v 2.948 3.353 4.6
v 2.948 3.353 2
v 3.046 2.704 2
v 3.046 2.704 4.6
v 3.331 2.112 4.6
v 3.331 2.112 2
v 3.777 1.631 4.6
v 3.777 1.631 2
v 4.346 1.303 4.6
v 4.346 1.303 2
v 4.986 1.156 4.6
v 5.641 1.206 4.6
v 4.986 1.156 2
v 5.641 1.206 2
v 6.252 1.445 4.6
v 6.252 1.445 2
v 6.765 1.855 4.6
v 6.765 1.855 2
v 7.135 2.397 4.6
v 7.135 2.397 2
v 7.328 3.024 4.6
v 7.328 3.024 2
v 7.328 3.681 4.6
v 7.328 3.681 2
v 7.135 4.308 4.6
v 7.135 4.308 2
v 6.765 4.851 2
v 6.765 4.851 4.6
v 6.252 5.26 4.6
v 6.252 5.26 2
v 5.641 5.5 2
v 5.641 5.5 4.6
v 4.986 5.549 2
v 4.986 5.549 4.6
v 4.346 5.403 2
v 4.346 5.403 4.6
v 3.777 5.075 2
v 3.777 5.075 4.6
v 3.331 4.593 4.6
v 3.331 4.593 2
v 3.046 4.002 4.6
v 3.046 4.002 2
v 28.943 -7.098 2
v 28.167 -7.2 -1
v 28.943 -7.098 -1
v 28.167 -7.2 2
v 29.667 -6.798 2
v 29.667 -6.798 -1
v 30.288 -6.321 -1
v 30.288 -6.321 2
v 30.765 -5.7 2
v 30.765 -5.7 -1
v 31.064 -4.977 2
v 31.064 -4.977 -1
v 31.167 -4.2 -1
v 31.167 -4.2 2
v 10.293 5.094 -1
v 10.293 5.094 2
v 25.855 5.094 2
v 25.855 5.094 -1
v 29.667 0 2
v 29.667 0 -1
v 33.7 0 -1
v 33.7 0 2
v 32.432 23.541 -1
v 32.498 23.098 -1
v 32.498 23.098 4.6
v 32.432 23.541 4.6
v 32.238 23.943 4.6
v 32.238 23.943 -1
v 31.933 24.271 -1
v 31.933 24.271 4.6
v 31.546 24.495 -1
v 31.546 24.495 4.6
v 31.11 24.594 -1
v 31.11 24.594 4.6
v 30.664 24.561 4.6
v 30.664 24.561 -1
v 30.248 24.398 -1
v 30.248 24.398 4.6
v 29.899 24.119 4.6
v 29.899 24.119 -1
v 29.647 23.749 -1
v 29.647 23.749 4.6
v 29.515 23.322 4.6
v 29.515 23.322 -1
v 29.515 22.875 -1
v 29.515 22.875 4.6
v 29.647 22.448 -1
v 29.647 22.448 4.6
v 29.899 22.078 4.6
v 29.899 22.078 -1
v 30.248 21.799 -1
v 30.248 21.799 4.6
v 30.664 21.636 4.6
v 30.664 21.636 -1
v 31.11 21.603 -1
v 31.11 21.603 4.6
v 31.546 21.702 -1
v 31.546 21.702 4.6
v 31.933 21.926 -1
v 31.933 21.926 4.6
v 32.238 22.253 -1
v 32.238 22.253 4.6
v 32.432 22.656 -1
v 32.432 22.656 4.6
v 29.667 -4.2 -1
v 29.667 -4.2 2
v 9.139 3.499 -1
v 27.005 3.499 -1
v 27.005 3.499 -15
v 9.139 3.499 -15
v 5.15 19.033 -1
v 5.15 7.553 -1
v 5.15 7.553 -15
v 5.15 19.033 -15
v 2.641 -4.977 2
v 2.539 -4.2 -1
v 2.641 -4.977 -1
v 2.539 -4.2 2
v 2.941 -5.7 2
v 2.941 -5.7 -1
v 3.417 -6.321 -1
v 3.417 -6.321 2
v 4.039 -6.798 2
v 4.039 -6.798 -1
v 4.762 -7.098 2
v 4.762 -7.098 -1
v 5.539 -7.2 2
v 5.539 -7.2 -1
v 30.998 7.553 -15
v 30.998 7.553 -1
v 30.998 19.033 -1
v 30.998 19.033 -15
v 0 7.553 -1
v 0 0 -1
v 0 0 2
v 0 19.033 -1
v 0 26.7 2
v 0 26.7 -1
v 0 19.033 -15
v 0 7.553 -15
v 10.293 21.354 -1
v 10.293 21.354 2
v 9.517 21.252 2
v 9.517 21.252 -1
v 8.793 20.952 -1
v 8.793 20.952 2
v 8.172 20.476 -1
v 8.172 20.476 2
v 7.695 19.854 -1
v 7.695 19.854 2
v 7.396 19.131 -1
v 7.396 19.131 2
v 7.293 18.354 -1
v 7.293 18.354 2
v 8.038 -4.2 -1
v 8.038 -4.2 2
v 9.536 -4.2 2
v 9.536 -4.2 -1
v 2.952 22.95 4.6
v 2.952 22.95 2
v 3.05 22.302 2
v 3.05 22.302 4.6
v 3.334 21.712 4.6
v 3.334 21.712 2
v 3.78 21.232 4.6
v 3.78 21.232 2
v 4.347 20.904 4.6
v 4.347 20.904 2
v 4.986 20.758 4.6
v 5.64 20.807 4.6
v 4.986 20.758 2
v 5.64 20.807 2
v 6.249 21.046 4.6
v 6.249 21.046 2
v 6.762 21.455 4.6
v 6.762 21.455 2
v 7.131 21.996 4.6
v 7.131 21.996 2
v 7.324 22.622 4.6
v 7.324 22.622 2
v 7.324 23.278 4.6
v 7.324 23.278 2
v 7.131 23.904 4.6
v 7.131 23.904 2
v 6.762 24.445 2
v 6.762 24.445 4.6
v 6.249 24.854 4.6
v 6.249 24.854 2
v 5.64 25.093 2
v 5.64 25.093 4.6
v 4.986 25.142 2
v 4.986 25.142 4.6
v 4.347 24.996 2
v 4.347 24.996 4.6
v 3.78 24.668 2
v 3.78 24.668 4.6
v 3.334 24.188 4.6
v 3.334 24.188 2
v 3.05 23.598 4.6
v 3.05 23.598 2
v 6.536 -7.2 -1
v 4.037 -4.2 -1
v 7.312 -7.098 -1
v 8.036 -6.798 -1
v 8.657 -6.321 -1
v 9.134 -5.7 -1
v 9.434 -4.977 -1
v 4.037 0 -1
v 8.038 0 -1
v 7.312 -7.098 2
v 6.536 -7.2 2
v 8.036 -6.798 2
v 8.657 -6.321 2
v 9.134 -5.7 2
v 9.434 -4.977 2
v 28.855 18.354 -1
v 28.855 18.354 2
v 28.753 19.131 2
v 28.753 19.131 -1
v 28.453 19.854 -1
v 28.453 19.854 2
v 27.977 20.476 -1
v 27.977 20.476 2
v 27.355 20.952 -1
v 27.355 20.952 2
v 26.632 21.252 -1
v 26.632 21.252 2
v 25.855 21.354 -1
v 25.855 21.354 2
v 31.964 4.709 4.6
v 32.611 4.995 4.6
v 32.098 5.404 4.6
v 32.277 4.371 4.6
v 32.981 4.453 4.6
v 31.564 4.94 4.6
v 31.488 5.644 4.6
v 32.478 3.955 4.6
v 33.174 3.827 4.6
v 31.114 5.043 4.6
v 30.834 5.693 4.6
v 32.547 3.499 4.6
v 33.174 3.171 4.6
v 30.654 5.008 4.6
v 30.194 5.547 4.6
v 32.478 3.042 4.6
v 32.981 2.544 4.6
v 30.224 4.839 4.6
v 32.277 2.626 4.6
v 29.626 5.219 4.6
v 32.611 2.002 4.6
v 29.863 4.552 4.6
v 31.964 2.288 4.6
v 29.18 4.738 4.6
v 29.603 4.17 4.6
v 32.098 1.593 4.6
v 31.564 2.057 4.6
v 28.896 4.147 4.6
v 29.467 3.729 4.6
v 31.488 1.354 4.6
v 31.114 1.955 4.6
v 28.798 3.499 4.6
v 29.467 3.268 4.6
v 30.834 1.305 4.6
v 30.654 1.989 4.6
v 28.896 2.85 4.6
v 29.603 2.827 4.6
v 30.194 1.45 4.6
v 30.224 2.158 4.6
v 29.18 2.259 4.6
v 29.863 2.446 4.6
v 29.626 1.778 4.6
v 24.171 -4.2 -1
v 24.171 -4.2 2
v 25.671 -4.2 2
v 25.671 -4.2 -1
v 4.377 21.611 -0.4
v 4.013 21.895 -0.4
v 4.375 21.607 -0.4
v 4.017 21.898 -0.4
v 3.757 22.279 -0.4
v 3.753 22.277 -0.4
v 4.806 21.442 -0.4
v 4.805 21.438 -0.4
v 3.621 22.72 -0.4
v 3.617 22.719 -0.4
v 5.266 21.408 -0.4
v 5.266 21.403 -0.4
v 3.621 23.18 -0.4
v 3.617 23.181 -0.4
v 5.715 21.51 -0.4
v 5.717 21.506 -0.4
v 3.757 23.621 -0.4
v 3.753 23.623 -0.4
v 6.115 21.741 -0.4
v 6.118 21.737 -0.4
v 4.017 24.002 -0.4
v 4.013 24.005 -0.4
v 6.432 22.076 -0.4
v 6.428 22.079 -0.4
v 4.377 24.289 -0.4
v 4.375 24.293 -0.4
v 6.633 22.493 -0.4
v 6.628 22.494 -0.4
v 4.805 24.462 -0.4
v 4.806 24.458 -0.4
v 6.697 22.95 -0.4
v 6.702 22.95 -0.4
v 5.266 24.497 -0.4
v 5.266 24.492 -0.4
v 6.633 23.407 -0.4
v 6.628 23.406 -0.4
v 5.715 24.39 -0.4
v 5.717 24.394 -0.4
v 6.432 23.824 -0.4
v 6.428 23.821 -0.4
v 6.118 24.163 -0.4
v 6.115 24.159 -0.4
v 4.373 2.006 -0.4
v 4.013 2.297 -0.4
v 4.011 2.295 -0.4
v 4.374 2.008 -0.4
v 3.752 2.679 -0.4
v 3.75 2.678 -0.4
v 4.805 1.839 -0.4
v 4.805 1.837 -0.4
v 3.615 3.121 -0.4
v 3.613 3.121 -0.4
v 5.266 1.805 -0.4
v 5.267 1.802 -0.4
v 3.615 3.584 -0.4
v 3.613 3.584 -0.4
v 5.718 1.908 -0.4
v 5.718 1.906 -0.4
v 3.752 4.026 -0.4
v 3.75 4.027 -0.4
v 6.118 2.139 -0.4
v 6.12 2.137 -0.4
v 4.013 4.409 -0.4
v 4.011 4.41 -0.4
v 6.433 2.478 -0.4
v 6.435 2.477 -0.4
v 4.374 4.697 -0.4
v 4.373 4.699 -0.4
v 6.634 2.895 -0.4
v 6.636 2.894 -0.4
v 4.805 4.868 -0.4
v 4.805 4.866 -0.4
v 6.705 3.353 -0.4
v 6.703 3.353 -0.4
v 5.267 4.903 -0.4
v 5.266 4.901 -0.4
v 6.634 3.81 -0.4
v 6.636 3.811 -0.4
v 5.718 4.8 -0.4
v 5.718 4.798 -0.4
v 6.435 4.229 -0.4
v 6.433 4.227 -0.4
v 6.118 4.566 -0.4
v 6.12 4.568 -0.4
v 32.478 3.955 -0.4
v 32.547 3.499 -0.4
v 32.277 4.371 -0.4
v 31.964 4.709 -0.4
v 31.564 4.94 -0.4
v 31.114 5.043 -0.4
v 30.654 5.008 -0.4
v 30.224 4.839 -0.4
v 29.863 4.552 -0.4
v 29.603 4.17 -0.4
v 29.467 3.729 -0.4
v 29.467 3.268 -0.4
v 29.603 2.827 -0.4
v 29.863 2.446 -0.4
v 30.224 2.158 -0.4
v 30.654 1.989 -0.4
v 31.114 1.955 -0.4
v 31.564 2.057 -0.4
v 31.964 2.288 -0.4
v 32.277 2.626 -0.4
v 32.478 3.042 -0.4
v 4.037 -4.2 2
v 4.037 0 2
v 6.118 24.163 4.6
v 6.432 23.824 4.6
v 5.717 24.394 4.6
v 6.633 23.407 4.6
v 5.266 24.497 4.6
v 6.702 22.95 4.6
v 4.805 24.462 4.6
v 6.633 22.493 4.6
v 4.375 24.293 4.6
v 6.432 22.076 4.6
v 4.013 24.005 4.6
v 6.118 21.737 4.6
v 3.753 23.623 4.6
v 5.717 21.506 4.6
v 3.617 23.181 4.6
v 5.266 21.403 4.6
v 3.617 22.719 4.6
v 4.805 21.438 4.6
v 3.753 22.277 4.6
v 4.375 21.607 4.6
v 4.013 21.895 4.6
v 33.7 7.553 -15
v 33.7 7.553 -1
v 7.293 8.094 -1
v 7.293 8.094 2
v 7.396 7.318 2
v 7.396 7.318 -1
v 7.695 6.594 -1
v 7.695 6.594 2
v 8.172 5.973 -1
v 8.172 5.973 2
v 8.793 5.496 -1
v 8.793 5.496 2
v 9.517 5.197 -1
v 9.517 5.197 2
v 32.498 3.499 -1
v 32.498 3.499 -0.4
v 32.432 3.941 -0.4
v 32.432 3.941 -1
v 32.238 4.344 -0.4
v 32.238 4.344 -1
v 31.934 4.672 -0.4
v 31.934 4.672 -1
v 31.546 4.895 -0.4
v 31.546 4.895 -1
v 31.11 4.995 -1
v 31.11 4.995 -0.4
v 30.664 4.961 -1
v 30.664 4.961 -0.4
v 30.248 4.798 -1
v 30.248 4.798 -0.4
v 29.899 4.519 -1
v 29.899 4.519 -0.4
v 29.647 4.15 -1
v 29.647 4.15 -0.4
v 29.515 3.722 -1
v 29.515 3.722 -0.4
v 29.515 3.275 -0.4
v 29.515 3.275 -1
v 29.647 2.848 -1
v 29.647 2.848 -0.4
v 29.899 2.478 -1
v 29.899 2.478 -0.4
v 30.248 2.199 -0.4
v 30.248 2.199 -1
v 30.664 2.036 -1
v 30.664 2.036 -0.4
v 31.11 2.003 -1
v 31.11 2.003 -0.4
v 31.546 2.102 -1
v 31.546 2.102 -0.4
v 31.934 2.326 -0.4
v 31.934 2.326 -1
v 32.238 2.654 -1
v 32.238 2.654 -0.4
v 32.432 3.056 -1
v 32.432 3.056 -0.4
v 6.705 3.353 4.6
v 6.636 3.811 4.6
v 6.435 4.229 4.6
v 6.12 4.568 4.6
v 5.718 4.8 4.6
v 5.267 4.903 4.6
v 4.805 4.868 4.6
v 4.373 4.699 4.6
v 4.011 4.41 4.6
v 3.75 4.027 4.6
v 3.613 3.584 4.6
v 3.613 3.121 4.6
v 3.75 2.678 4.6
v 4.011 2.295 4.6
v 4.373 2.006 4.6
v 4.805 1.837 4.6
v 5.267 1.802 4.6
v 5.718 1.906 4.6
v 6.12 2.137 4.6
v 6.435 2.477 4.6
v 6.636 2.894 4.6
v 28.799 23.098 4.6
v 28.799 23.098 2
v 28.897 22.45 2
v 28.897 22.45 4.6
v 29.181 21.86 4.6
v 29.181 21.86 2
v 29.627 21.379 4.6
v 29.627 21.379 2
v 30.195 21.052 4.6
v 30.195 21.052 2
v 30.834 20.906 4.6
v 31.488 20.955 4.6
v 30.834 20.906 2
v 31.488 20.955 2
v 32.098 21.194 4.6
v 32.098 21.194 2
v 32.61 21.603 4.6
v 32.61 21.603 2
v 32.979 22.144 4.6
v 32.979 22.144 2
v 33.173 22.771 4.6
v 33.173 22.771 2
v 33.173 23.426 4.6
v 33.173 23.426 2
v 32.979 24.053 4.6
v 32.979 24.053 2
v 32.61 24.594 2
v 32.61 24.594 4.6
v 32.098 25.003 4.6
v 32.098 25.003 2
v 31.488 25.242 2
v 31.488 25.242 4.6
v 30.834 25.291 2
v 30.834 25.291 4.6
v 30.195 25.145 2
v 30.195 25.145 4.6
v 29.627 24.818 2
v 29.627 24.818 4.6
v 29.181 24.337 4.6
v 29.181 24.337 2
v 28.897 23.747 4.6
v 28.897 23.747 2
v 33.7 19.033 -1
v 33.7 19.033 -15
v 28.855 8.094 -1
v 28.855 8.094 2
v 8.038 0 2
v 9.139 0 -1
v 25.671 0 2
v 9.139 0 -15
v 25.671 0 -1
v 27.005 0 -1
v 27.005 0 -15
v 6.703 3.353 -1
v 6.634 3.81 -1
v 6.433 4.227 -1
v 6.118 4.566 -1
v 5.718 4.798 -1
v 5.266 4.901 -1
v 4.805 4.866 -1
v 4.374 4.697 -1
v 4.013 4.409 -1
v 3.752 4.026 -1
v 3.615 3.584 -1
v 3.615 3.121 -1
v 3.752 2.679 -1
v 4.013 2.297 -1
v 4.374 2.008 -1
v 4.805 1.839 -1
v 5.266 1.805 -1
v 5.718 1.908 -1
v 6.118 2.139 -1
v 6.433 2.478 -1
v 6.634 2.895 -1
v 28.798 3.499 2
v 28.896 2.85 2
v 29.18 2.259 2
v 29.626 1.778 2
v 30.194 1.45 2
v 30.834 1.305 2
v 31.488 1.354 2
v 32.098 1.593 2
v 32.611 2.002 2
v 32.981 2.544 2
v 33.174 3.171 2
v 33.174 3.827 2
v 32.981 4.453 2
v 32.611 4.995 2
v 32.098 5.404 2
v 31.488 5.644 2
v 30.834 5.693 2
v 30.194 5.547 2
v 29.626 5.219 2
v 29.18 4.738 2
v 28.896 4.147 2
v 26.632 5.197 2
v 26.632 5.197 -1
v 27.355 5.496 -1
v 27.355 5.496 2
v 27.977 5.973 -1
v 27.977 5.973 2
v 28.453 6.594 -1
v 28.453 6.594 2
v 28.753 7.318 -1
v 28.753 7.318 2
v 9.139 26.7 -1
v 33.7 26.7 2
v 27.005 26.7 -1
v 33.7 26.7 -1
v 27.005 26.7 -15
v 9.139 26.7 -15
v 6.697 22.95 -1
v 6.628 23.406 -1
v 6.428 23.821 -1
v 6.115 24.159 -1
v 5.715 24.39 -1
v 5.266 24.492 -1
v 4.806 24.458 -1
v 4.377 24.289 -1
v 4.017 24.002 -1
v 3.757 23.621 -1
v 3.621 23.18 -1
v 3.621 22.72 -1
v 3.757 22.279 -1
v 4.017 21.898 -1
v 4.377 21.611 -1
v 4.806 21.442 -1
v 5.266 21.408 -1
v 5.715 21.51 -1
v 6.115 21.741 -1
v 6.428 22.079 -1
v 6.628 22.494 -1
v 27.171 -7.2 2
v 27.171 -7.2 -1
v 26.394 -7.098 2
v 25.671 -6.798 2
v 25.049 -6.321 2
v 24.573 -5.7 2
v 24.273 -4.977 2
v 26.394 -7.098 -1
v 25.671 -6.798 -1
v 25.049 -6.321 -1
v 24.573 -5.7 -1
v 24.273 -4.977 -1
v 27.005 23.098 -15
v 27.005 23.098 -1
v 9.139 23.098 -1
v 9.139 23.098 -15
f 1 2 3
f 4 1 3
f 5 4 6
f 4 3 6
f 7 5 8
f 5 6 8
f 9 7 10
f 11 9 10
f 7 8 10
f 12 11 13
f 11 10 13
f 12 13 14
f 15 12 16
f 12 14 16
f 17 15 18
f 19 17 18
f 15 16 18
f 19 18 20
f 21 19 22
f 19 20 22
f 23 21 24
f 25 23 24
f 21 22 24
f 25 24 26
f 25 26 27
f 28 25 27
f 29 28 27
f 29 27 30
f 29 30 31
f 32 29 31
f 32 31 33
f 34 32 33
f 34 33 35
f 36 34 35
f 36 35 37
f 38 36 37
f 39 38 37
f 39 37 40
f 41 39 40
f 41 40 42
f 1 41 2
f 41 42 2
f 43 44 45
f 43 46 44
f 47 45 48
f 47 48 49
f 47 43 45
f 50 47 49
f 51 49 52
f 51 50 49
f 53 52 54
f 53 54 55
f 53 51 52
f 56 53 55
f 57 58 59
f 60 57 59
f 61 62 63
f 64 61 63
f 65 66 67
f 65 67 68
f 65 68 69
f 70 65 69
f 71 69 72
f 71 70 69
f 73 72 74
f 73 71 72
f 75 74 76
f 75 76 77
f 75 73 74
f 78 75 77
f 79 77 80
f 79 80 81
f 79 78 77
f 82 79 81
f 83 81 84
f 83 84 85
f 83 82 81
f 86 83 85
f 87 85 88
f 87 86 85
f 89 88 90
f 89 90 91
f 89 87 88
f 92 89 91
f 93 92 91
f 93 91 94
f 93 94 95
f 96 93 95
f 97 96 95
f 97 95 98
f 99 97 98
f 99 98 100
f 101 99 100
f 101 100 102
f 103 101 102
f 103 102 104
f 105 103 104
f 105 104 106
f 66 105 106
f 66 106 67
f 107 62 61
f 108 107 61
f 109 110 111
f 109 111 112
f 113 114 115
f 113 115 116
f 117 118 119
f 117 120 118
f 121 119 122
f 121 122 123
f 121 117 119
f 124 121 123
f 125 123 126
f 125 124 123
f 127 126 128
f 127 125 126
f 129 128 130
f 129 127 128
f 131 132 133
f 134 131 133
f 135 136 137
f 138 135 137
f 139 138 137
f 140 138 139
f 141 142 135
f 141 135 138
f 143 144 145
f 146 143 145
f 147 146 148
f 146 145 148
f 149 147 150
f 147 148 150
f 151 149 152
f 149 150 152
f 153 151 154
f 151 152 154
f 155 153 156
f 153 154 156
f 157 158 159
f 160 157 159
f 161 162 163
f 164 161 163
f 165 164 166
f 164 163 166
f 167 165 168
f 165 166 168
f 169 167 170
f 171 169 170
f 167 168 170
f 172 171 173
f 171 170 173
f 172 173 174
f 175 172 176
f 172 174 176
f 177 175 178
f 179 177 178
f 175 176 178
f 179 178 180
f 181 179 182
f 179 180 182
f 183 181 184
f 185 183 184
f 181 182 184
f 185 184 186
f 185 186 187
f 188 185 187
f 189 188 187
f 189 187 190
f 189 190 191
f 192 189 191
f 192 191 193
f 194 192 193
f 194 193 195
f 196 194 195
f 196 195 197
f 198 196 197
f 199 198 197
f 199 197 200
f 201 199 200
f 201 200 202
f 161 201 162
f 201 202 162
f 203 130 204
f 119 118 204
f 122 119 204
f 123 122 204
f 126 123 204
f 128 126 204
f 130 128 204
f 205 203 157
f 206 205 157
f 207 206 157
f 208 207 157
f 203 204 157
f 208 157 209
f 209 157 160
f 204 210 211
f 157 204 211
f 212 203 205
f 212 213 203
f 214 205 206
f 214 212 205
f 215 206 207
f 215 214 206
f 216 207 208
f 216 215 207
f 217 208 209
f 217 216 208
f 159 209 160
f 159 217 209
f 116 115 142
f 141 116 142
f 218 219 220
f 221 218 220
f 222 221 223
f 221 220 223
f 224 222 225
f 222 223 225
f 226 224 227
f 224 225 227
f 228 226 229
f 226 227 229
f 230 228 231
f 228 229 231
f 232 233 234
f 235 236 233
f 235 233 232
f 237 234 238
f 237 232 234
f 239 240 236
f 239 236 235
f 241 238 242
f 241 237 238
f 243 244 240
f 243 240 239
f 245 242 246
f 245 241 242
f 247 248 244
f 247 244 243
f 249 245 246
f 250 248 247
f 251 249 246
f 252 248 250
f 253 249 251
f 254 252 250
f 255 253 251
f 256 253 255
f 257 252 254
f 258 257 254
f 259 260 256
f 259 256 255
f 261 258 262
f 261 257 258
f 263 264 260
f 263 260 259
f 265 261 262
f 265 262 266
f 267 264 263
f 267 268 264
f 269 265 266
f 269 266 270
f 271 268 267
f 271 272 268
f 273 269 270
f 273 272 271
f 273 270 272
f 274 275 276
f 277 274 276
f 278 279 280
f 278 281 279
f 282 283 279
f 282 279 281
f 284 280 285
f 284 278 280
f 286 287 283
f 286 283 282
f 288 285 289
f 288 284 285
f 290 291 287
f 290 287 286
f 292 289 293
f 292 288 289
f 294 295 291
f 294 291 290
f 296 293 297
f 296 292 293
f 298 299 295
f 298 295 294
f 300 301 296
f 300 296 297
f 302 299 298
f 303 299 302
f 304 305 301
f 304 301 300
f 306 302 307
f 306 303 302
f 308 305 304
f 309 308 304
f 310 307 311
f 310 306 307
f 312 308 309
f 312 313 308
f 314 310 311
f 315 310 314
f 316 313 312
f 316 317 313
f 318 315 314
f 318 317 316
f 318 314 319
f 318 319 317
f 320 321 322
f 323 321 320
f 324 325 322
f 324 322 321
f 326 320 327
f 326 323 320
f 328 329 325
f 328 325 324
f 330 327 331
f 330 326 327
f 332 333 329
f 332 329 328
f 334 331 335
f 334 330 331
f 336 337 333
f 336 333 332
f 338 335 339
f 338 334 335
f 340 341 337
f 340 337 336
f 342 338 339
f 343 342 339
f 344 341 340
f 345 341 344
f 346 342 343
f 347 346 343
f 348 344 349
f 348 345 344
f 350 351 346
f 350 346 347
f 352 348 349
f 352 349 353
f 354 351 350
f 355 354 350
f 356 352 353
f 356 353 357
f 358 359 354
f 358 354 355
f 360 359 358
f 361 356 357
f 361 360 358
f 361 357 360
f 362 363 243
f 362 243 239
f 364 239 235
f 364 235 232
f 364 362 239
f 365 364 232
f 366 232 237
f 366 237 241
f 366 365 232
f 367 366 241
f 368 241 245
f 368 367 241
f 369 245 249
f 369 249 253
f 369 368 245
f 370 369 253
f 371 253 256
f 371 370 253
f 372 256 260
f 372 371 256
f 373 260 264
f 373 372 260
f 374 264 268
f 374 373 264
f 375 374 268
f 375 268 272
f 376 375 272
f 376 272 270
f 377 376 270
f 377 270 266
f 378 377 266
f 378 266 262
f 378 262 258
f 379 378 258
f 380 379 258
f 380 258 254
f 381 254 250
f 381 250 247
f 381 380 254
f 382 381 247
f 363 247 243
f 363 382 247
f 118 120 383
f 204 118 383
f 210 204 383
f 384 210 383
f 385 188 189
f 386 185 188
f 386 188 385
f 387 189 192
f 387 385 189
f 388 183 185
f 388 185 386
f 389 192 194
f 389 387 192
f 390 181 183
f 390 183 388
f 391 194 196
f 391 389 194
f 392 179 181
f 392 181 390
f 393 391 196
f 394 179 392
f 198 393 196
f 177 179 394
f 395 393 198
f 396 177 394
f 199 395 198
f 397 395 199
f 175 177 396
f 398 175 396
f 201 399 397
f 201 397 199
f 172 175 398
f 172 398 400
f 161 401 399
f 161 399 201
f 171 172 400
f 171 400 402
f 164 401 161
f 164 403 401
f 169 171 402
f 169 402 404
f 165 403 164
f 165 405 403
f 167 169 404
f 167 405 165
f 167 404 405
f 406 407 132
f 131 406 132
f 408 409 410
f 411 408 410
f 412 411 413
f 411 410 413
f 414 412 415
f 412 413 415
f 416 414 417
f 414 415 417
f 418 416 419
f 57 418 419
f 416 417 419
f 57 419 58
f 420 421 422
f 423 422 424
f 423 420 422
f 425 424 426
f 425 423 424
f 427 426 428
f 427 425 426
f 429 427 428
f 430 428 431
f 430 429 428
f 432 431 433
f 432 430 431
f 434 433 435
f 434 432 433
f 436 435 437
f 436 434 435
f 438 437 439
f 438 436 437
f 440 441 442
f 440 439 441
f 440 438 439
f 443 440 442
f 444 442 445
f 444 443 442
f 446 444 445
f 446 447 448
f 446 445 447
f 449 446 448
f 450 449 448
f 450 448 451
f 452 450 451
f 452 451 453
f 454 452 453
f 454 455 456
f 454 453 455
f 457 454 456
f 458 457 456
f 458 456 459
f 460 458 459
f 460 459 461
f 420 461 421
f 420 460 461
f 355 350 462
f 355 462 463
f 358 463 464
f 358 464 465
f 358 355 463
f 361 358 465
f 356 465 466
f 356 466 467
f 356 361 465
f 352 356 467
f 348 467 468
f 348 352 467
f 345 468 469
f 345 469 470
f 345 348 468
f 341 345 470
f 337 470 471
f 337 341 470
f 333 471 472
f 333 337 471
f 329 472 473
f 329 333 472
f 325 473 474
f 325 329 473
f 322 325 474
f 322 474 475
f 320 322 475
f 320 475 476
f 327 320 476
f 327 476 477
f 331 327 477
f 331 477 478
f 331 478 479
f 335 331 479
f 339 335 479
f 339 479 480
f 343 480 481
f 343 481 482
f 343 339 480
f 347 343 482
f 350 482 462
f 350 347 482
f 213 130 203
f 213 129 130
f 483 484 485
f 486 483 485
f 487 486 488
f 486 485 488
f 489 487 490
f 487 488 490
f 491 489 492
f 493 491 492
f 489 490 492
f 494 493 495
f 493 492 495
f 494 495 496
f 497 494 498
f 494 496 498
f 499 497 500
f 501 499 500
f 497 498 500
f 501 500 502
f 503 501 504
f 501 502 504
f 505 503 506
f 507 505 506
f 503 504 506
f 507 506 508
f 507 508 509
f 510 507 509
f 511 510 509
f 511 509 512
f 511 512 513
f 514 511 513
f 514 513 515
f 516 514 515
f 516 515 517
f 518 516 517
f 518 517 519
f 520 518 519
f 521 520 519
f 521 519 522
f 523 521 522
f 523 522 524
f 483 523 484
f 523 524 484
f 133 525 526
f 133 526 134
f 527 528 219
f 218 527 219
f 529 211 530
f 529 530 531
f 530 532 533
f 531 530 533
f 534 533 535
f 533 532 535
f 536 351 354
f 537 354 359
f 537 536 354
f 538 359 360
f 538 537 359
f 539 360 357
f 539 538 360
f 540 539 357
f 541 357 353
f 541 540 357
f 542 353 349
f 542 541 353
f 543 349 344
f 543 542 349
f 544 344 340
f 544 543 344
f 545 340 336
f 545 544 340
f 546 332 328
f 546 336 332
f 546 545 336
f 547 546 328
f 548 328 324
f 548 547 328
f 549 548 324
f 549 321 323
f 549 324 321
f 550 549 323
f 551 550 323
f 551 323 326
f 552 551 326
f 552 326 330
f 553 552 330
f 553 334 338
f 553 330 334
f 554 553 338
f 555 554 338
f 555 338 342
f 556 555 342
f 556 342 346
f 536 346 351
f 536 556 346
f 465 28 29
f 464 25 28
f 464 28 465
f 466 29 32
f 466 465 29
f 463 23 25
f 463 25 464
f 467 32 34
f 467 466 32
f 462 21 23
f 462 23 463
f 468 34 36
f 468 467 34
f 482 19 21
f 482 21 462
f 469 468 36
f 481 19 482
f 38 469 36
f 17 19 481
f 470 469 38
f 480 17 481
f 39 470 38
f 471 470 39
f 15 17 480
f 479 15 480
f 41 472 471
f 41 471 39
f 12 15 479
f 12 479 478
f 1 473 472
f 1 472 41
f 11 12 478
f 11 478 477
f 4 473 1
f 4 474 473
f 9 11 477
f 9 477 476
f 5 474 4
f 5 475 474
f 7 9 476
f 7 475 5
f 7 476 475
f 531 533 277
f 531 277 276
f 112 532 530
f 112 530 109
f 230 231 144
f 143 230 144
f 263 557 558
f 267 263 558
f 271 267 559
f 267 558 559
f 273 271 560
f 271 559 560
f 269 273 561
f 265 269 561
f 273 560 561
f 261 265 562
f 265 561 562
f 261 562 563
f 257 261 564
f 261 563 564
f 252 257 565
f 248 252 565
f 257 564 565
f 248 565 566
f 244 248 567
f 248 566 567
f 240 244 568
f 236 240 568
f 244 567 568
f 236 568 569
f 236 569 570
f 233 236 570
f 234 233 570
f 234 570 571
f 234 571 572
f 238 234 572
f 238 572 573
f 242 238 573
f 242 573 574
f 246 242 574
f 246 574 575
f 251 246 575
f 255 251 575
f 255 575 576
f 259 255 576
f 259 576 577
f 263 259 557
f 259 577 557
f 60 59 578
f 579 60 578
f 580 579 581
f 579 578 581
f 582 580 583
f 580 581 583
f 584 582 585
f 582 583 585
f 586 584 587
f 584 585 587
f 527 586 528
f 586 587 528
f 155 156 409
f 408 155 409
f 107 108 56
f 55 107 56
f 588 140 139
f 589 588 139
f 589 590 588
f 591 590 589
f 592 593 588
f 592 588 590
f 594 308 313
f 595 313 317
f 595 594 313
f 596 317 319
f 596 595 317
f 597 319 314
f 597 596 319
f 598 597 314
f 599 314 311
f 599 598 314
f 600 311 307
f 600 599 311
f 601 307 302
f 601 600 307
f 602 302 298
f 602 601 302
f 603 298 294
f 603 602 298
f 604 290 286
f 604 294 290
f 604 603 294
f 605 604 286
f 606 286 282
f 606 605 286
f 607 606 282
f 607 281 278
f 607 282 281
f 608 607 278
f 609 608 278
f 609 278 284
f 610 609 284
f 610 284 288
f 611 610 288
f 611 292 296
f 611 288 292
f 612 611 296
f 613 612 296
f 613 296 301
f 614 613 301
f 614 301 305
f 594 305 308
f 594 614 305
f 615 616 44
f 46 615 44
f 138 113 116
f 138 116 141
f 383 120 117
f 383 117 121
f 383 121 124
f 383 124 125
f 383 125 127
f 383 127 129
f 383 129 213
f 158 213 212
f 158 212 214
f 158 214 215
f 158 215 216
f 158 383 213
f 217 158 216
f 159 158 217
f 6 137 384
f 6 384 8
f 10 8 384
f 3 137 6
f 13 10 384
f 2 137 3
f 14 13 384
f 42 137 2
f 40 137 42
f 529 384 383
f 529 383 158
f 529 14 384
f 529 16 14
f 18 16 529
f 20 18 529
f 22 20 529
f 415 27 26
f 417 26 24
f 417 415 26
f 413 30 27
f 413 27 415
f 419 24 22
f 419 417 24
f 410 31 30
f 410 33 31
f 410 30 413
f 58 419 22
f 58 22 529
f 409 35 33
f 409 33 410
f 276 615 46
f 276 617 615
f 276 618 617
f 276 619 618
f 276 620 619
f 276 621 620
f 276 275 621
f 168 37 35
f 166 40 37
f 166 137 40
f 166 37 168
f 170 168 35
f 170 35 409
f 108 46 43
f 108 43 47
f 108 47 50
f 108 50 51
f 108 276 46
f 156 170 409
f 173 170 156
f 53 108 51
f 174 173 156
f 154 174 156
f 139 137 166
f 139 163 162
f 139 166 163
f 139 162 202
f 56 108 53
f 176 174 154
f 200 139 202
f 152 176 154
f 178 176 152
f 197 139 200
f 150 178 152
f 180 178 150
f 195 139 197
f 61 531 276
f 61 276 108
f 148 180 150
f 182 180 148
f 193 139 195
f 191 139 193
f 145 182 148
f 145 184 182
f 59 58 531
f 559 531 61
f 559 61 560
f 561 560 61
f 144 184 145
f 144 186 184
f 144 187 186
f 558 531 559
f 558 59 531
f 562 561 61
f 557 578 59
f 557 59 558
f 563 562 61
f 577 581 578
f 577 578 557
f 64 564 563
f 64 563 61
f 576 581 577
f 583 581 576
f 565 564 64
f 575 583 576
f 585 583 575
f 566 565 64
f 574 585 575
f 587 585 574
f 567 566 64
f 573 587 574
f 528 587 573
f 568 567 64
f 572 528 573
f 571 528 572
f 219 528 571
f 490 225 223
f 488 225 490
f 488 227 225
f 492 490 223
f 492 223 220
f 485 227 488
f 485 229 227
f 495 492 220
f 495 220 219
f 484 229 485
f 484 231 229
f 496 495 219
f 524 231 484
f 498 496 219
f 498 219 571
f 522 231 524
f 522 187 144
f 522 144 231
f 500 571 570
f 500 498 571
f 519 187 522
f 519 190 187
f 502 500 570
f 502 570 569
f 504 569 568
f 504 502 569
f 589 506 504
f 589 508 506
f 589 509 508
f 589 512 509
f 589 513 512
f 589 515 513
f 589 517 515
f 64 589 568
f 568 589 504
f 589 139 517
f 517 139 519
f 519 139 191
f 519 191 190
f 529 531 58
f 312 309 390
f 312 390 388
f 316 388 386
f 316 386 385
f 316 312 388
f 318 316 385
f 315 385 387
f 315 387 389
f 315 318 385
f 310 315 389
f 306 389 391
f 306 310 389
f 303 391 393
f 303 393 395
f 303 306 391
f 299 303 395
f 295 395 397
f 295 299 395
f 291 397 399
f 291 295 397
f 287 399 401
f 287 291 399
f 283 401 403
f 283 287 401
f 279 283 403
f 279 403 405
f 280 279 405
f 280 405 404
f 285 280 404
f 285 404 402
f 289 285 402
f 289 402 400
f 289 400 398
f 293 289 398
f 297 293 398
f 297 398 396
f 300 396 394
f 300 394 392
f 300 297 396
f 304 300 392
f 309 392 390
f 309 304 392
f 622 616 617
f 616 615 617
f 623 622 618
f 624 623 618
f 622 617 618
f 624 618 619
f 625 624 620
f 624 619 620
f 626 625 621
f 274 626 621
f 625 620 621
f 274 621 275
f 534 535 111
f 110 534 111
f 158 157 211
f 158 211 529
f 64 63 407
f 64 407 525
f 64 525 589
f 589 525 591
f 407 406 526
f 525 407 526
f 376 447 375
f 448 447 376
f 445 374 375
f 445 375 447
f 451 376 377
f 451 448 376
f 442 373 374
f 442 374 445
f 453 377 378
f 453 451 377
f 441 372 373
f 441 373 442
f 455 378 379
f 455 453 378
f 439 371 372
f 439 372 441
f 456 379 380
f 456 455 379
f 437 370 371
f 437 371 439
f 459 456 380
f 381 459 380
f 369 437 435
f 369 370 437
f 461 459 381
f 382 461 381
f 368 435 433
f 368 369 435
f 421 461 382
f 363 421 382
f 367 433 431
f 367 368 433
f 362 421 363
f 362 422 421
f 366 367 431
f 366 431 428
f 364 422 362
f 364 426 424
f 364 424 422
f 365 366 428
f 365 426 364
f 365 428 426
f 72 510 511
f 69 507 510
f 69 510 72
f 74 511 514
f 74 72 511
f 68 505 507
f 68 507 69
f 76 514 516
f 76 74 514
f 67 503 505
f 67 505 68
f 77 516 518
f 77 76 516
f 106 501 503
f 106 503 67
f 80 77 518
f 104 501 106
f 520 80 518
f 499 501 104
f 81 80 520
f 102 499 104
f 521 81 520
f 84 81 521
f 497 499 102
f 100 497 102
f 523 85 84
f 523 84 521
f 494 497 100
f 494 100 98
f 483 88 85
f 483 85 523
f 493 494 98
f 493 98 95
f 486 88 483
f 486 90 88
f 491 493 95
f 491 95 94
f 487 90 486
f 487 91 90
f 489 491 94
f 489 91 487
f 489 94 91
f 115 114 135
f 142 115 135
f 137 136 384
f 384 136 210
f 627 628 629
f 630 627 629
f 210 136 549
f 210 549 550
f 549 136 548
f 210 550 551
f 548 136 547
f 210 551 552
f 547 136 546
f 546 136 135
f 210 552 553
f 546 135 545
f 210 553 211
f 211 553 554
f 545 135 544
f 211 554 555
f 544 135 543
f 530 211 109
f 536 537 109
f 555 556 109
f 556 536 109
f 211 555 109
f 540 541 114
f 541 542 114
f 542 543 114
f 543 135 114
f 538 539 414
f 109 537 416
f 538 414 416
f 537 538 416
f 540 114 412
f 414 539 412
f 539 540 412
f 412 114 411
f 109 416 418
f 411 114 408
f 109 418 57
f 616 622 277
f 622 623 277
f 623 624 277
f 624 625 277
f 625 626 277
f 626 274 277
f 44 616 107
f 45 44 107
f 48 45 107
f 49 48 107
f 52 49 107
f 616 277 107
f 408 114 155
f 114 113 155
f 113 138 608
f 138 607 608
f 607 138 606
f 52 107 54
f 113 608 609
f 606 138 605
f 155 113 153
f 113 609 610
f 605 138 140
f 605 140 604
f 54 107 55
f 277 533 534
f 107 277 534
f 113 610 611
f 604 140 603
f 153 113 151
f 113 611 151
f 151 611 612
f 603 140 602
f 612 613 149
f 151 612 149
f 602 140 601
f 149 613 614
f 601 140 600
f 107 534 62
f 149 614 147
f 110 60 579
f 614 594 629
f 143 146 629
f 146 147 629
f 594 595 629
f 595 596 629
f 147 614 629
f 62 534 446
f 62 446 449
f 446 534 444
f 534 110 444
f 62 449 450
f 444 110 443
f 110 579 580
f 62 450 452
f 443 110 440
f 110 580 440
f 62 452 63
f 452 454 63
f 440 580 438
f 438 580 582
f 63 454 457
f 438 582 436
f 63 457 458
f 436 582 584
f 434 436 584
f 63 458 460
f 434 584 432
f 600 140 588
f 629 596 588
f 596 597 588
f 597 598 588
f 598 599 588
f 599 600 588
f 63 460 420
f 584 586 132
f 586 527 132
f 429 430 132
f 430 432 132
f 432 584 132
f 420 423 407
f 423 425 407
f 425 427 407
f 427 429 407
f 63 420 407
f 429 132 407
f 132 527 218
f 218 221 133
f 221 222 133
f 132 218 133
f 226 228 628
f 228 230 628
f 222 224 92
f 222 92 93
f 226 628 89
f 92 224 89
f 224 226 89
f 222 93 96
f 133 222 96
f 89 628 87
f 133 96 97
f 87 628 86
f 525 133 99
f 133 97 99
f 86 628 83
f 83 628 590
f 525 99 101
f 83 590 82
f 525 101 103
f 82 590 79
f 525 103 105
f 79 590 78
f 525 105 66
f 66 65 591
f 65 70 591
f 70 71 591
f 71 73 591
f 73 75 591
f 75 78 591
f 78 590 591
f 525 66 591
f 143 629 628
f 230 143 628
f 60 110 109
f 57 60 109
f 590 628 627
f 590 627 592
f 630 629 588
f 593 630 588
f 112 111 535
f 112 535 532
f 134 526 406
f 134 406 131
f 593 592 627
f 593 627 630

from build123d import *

# Parameters (mm, degrees)
EXTRUDE_1_DEPTH      = 2
EXTRUDE_1_DEPTH_BACK = 1
SKETCH_2_W           = 33.7
SKETCH_2_H           = 26.7
SKETCH_2_R           = 1.500160794
SKETCH_2_R_2         = 1.5
SKETCH_2_R_3         = 1.552324123
SKETCH_2_R_4         = 1.546482565
CUT_EXTRUDE_1_DEPTH  = 3
SKETCH_5_R           = 2.197988189
SKETCH_5_R_2         = 2.198876818
SKETCH_5_R_3         = 2.200287149
SKETCH_5_R_4         = 2.202466949
EXTRUDE_2_DEPTH      = 2.6
CUT_EXTRUDE_START    = -5
SKETCH_6_R           = 1.551176975
SKETCH_6_R_2         = 1.55471391
SKETCH_6_R_3         = 1.548240493
SKETCH_6_R_4         = 1.5
CUT_EXTRUDE_2_DEPTH  = 5
SKETCH_10_W          = 17.866024145
SKETCH_10_H          = 3.498646338
SKETCH_10_H_2        = 3.601530827
SKETCH_10_W_2        = 2.701736104
SKETCH_10_H_3        = 11.479623975
SKETCH_10_W_3        = 5.150482455
EXTRUDE_4_DEPTH      = 14
SKETCH_11_W          = 4.001103287
SKETCH_11_H          = 3.000250535
SKETCH_11_W_2        = 3.995812133
SKETCH_11_H_2        = 3
EXTRUDE_5_DEPTH      = 4.2
SKETCH_12_W          = 6.996994273
SKETCH_12_H          = 3.000250535
SKETCH_12_W_2        = 6.995985491
SKETCH_12_H_2        = 3
EXTRUDE_6_DEPTH      = 3
FILLET_4_R           = 3
FILLET_5_R           = 3
FILLET_6_R           = 3
FILLET_7_R           = 3


with BuildPart() as part:
    # Эскиз2 → Бобышка-Вытянуть1 (new, two sides: drawn at the far end of the back side and taken through both)
    with BuildSketch(Plane.XY.offset(-EXTRUDE_1_DEPTH_BACK)):
        with Locations((16.85, 13.35)):
            Rectangle(SKETCH_2_W, SKETCH_2_H)
        with Locations((30.998263896, 3.498646338)):
            Circle(SKETCH_2_R, mode=Mode.SUBTRACT)
        with Locations((30.998263896, 23.098469173)):
            Circle(SKETCH_2_R_2, mode=Mode.SUBTRACT)
        with Locations((5.150482455, 3.352746683)):
            Circle(SKETCH_2_R_3, mode=Mode.SUBTRACT)
        with Locations((5.150482455, 22.950000581)):
            Circle(SKETCH_2_R_4, mode=Mode.SUBTRACT)
    extrude(amount=EXTRUDE_1_DEPTH + EXTRUDE_1_DEPTH_BACK)

    # Эскиз4 → Вырез-Вытянуть1 (cut)
    with BuildSketch(Plane.XY.offset(2)):
        with BuildLine():
            Line((10.293463676, 5.094435071), (25.855282675, 5.094435071))
            ThreePointArc((25.855282675, 5.094435071), (27.976603018, 5.973114728), (28.855282675, 8.094435071))
            Line((28.855282675, 8.094435071), (28.855282675, 18.354211847))
            ThreePointArc((28.855282675, 18.354211847), (27.976603018, 20.475532191), (25.855282675, 21.354211847))
            Line((25.855282675, 21.354211847), (10.293463676, 21.354211847))
            ThreePointArc((10.293463676, 21.354211847), (8.172143332, 20.475532191), (7.293463676, 18.354211847))
            Line((7.293463676, 18.354211847), (7.293463676, 8.094435071))
            ThreePointArc((7.293463676, 8.094435071), (8.172143332, 5.973114728), (10.293463676, 5.094435071))
        make_face()
    extrude(amount=-CUT_EXTRUDE_1_DEPTH, mode=Mode.SUBTRACT)

    # Эскиз5 → Бобышка-Вытянуть2 (add)
    with BuildSketch(Plane.XY.offset(2)):
        with Locations(Location((5.150482455, 22.950000581, 0), (0, 0, 180))):
            Circle(SKETCH_5_R)
        with Locations(Location((30.998263896, 23.098469173, 0), (0, 0, 180))):
            Circle(SKETCH_5_R_2)
        with Locations(Location((30.998263896, 3.498646338, 0), (0, 0, 180))):
            Circle(SKETCH_5_R_3)
        with Locations(Location((5.150482455, 3.352746683, 0), (0, 0, 180))):
            Circle(SKETCH_5_R_4)
    extrude(amount=EXTRUDE_2_DEPTH)

    # Эскиз6 → Вырез-Вытянуть2 (cut)
    with BuildSketch(Plane.XY.offset(4.6).offset(CUT_EXTRUDE_START)):
        with Locations((5.150482455, 22.950000581)):
            Circle(SKETCH_6_R)
        with Locations((5.150482455, 3.352746683)):
            Circle(SKETCH_6_R_2)
        with Locations((30.998263896, 3.498646338)):
            Circle(SKETCH_6_R_3)
        with Locations((30.998263896, 23.098469173)):
            Circle(SKETCH_6_R_4)
    extrude(amount=CUT_EXTRUDE_2_DEPTH, mode=Mode.SUBTRACT)

    # Эскиз10 → Бобышка-Вытянуть4 (add)
    with BuildSketch(Plane(origin=(0, 0, -1), x_dir=(-1, 0, 0), z_dir=(0, 0, -1))):
        with Locations((-18.071569917, 1.749323169)):
            Rectangle(SKETCH_10_W, SKETCH_10_H)
        with Locations((-18.071569917, 24.899234587)):
            Rectangle(SKETCH_10_W, SKETCH_10_H_2)
        with Locations((-32.349131948, 13.292689749)):
            Rectangle(SKETCH_10_W_2, SKETCH_10_H_3)
        with Locations((-2.575241228, 13.292689749)):
            Rectangle(SKETCH_10_W_3, SKETCH_10_H_3)
    extrude(amount=EXTRUDE_4_DEPTH)

    # Эскиз11 → Бобышка-Вытянуть5 (add)
    with BuildSketch(Plane.XZ):
        with Locations((6.037312514, 0.499874732)):
            Rectangle(SKETCH_11_W, SKETCH_11_H)
        with Locations((27.668636997, 0.5)):
            Rectangle(SKETCH_11_W_2, SKETCH_11_H_2)
    extrude(amount=EXTRUDE_5_DEPTH)

    # Эскиз12 → Бобышка-Вытянуть6 (add)
    with BuildSketch(Plane.XZ.offset(4.2)):
        with Locations((6.037312514, 0.499874732)):
            Rectangle(SKETCH_12_W, SKETCH_12_H)
        with Locations((27.668636997, 0.5)):
            Rectangle(SKETCH_12_W_2, SKETCH_12_H_2)
    extrude(amount=EXTRUDE_6_DEPTH)

    # Скругление4
    fillet_4_edges = [part.edges().sort_by_distance(p)[0] for p in [
        (2.538815377, -7.2, 0.499874732),
    ]]
    fillet(fillet_4_edges, radius=FILLET_4_R - 0.0001)  # a hair under: the kernel refuses the full size

    # Скругление5
    fillet_5_edges = [part.edges().sort_by_distance(p)[0] for p in [
        (9.53580965, -7.2, 0.499874732),
    ]]
    fillet(fillet_5_edges, radius=FILLET_5_R - 0.0001)  # a hair under: the kernel refuses the full size

    # Скругление6
    fillet_6_edges = [part.edges().sort_by_distance(p)[0] for p in [
        (31.166629742, -7.2, 0.5),
    ]]
    fillet(fillet_6_edges, radius=FILLET_6_R - 0.0001)  # a hair under: the kernel refuses the full size

    # Скругление7
    fillet_7_edges = [part.edges().sort_by_distance(p)[0] for p in [
        (24.170644251, -7.2, 0.5),
    ]]
    fillet(fillet_7_edges, radius=FILLET_7_R - 0.0001)  # a hair under: the kernel refuses the full size


solid = part.part
